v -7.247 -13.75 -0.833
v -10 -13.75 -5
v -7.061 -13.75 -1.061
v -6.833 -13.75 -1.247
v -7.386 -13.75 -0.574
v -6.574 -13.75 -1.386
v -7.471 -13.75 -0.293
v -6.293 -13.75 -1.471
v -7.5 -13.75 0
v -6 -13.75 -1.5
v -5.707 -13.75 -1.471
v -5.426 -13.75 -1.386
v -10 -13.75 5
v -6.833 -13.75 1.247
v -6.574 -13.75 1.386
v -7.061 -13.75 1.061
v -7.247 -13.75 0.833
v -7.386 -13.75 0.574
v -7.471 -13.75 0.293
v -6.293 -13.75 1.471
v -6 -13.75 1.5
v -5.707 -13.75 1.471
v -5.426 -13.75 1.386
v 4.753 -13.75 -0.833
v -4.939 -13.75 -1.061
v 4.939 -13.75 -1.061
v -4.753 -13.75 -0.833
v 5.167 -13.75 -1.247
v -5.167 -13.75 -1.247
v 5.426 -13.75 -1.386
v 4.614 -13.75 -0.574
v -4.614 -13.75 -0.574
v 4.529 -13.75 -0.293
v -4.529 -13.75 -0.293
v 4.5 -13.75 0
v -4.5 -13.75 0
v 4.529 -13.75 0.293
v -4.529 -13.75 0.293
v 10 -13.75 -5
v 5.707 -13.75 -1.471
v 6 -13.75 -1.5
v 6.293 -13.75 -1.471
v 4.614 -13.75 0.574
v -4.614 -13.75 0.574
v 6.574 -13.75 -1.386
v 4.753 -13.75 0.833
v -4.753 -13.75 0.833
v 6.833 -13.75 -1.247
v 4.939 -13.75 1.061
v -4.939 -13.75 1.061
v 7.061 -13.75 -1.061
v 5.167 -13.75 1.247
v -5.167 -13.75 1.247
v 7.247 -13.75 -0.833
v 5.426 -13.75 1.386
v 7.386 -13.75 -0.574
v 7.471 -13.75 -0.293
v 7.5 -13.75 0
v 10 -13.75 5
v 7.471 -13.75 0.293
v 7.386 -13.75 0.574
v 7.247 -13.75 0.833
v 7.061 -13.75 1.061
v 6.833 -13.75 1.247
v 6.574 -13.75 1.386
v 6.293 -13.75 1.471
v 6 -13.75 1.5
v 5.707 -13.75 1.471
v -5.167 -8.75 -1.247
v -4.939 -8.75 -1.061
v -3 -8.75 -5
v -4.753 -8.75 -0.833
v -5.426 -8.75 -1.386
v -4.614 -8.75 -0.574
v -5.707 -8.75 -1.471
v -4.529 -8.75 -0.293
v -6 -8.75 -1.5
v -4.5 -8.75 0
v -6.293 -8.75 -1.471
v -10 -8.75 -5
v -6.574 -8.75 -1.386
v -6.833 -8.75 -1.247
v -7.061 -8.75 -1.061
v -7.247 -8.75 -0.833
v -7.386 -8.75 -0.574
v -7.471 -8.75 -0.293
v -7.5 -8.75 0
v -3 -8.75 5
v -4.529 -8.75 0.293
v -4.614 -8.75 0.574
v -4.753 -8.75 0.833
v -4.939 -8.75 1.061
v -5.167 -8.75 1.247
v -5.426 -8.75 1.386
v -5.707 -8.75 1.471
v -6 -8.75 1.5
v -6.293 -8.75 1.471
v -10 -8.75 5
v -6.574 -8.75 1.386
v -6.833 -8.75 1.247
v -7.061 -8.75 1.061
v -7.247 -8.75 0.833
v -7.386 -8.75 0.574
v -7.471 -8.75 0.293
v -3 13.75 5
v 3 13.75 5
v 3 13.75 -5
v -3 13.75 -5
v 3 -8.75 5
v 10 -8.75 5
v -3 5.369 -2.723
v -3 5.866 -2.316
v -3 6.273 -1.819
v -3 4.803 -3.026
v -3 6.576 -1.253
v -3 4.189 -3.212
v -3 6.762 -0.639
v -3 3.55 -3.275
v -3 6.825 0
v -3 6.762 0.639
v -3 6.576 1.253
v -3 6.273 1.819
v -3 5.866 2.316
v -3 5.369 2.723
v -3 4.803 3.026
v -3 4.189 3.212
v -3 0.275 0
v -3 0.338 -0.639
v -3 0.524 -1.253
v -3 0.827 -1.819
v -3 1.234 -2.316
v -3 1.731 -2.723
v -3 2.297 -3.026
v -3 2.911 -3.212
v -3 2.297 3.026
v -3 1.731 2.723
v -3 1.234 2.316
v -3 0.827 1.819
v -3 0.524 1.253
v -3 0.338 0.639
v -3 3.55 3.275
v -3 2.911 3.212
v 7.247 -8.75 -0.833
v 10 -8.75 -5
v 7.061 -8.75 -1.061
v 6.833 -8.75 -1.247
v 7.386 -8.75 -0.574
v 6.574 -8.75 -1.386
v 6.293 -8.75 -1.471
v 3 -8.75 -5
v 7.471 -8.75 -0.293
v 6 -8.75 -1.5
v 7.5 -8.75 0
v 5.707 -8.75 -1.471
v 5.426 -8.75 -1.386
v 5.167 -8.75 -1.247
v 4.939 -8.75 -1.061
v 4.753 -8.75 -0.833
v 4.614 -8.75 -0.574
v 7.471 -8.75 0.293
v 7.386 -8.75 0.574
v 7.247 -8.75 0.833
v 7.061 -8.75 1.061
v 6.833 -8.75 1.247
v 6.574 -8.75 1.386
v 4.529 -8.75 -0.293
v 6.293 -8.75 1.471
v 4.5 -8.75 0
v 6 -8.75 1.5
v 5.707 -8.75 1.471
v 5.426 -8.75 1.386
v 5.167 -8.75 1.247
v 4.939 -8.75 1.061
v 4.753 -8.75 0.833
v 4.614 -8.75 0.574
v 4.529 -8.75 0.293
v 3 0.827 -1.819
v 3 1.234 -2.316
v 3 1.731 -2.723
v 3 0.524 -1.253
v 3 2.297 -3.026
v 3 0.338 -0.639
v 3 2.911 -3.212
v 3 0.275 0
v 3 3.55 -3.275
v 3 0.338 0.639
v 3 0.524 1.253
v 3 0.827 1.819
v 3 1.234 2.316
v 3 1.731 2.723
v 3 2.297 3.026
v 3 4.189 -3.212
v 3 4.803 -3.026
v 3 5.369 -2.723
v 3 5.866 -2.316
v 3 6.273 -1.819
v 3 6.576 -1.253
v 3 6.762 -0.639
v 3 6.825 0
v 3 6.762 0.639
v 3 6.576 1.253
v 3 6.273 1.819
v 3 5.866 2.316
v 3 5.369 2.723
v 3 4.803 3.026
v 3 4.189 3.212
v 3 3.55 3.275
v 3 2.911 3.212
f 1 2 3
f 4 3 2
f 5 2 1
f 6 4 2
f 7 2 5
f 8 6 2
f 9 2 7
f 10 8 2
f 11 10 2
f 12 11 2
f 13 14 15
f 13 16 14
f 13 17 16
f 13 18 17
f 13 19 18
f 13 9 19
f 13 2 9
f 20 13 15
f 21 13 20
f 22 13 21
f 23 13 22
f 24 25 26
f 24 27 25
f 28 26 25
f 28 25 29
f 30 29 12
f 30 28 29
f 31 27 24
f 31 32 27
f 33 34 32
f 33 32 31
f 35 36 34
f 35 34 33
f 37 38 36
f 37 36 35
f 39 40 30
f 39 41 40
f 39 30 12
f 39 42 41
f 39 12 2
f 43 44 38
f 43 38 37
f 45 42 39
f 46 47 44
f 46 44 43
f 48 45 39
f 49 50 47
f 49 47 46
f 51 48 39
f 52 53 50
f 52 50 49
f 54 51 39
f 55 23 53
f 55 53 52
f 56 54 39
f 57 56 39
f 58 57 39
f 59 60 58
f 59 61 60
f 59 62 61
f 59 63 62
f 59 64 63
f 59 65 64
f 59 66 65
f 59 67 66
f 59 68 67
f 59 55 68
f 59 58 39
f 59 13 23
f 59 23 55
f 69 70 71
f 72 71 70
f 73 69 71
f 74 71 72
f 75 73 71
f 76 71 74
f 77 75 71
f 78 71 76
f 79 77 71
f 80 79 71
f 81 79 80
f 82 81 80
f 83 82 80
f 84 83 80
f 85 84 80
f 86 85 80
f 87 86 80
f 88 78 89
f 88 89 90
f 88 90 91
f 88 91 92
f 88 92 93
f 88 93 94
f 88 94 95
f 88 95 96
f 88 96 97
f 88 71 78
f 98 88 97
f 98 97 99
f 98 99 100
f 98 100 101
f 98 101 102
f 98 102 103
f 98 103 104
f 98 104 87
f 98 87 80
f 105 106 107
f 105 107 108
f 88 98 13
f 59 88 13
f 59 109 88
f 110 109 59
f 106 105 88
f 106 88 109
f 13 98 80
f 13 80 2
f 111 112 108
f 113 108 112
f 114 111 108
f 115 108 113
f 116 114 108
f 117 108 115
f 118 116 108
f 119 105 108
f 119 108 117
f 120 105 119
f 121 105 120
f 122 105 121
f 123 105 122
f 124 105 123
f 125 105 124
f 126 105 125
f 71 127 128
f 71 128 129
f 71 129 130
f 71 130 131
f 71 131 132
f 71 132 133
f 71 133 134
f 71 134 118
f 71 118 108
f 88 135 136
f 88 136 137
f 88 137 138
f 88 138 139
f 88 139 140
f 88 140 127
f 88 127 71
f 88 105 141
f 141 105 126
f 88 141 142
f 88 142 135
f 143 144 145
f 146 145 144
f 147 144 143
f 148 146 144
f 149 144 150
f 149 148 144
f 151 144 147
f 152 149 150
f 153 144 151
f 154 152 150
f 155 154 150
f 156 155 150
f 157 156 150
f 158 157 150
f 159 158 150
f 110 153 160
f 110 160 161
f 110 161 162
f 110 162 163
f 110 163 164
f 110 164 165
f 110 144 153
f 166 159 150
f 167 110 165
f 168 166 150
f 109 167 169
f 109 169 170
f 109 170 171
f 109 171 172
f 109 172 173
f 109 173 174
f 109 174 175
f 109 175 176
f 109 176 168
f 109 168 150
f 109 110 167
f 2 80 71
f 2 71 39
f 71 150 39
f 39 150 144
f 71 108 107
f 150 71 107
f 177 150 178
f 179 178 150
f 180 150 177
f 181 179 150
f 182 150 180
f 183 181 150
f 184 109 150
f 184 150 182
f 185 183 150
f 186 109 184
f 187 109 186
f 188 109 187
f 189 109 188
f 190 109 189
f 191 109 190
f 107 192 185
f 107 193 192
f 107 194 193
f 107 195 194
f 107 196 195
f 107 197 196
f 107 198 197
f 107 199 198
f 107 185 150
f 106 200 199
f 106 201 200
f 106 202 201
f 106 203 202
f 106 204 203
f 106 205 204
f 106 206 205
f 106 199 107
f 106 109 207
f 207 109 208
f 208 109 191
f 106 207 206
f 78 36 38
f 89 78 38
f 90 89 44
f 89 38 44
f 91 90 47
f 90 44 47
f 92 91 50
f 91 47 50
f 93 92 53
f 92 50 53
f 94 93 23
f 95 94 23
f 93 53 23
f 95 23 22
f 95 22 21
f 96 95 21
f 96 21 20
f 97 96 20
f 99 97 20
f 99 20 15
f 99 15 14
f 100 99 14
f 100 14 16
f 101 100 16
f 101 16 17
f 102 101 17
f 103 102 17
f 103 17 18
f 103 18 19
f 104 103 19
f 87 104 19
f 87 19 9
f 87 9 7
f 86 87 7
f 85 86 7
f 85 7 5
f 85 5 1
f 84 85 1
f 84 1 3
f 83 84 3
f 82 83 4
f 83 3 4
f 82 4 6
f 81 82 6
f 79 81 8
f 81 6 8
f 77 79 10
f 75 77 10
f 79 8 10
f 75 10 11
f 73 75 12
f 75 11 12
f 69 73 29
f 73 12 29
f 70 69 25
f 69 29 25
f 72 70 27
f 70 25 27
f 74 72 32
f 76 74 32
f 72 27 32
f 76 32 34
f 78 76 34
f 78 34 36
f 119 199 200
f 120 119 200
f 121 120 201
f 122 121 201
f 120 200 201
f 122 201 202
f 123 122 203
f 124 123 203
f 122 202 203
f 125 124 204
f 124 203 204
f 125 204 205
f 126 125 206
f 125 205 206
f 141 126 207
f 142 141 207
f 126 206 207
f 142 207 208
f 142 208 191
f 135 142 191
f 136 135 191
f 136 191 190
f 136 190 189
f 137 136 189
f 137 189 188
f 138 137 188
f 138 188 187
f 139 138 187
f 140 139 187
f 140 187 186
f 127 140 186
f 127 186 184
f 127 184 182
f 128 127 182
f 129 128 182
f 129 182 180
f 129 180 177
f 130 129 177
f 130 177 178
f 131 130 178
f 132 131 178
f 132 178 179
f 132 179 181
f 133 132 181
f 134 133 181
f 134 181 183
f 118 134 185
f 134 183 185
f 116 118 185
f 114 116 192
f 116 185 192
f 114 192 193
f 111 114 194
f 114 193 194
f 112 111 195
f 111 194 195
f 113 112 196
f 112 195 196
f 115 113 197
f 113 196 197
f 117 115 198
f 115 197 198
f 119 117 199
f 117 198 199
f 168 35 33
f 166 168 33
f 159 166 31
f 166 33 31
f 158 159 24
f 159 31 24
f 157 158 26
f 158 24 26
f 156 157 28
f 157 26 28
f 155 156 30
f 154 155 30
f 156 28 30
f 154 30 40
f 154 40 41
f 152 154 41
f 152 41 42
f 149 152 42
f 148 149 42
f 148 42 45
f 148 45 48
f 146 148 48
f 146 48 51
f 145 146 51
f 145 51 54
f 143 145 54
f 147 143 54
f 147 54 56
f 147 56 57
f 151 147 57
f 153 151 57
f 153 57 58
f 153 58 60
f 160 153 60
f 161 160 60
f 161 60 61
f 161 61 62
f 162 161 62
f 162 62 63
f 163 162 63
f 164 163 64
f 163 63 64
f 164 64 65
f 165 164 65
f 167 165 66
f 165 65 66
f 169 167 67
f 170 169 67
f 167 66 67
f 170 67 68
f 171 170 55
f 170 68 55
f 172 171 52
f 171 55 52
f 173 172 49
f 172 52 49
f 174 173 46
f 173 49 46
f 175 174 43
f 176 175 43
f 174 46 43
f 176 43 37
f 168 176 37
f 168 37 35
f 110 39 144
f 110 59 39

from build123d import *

# Parameters (mm, degrees)
SALIENTE_EXTRUIR1_DEPTH = 5
CROQUIS4_R              = 3.275
CORTAR_EXTRUIR3_DEPTH   = 15
CROQUIS5_R              = 1.5
CORTAR_EXTRUIR4_DEPTH   = 10


with BuildPart() as part:
    # Croquis1 → Saliente-Extruir1 (new, symmetric)
    with BuildSketch(Plane.XY):
        Polygon((3, -8.75), (3, 13.75), (0, 13.75), (0, -13.75), (10, -13.75), (10, -8.75), align=None)
        Polygon((0, -13.75), (0, 13.75), (-3, 13.75), (-3, -8.75), (-10, -8.75), (-10, -13.75), align=None)
    extrude(amount=SALIENTE_EXTRUIR1_DEPTH, both=True)

    # Croquis4 → Cortar-Extruir3 (cut)
    with BuildSketch(Plane(origin=(3, 0, 0), x_dir=(0, 0, -1), z_dir=(1, 0, 0))):
        with Locations(Location((0, 3.55, 0), (0, 0, 90))):
            Circle(CROQUIS4_R)
    extrude(amount=-CORTAR_EXTRUIR3_DEPTH, mode=Mode.SUBTRACT)

    # Croquis5 → Cortar-Extruir4 (cut)
    with BuildSketch(Plane.XZ.offset(13.75)):
        with Locations((-6, 0)):
            Circle(CROQUIS5_R)
        with Locations(Location((6, 0, 0), (0, 0, 180))):
            Circle(CROQUIS5_R)
    extrude(amount=-CORTAR_EXTRUIR4_DEPTH, mode=Mode.SUBTRACT)


solid = part.part
